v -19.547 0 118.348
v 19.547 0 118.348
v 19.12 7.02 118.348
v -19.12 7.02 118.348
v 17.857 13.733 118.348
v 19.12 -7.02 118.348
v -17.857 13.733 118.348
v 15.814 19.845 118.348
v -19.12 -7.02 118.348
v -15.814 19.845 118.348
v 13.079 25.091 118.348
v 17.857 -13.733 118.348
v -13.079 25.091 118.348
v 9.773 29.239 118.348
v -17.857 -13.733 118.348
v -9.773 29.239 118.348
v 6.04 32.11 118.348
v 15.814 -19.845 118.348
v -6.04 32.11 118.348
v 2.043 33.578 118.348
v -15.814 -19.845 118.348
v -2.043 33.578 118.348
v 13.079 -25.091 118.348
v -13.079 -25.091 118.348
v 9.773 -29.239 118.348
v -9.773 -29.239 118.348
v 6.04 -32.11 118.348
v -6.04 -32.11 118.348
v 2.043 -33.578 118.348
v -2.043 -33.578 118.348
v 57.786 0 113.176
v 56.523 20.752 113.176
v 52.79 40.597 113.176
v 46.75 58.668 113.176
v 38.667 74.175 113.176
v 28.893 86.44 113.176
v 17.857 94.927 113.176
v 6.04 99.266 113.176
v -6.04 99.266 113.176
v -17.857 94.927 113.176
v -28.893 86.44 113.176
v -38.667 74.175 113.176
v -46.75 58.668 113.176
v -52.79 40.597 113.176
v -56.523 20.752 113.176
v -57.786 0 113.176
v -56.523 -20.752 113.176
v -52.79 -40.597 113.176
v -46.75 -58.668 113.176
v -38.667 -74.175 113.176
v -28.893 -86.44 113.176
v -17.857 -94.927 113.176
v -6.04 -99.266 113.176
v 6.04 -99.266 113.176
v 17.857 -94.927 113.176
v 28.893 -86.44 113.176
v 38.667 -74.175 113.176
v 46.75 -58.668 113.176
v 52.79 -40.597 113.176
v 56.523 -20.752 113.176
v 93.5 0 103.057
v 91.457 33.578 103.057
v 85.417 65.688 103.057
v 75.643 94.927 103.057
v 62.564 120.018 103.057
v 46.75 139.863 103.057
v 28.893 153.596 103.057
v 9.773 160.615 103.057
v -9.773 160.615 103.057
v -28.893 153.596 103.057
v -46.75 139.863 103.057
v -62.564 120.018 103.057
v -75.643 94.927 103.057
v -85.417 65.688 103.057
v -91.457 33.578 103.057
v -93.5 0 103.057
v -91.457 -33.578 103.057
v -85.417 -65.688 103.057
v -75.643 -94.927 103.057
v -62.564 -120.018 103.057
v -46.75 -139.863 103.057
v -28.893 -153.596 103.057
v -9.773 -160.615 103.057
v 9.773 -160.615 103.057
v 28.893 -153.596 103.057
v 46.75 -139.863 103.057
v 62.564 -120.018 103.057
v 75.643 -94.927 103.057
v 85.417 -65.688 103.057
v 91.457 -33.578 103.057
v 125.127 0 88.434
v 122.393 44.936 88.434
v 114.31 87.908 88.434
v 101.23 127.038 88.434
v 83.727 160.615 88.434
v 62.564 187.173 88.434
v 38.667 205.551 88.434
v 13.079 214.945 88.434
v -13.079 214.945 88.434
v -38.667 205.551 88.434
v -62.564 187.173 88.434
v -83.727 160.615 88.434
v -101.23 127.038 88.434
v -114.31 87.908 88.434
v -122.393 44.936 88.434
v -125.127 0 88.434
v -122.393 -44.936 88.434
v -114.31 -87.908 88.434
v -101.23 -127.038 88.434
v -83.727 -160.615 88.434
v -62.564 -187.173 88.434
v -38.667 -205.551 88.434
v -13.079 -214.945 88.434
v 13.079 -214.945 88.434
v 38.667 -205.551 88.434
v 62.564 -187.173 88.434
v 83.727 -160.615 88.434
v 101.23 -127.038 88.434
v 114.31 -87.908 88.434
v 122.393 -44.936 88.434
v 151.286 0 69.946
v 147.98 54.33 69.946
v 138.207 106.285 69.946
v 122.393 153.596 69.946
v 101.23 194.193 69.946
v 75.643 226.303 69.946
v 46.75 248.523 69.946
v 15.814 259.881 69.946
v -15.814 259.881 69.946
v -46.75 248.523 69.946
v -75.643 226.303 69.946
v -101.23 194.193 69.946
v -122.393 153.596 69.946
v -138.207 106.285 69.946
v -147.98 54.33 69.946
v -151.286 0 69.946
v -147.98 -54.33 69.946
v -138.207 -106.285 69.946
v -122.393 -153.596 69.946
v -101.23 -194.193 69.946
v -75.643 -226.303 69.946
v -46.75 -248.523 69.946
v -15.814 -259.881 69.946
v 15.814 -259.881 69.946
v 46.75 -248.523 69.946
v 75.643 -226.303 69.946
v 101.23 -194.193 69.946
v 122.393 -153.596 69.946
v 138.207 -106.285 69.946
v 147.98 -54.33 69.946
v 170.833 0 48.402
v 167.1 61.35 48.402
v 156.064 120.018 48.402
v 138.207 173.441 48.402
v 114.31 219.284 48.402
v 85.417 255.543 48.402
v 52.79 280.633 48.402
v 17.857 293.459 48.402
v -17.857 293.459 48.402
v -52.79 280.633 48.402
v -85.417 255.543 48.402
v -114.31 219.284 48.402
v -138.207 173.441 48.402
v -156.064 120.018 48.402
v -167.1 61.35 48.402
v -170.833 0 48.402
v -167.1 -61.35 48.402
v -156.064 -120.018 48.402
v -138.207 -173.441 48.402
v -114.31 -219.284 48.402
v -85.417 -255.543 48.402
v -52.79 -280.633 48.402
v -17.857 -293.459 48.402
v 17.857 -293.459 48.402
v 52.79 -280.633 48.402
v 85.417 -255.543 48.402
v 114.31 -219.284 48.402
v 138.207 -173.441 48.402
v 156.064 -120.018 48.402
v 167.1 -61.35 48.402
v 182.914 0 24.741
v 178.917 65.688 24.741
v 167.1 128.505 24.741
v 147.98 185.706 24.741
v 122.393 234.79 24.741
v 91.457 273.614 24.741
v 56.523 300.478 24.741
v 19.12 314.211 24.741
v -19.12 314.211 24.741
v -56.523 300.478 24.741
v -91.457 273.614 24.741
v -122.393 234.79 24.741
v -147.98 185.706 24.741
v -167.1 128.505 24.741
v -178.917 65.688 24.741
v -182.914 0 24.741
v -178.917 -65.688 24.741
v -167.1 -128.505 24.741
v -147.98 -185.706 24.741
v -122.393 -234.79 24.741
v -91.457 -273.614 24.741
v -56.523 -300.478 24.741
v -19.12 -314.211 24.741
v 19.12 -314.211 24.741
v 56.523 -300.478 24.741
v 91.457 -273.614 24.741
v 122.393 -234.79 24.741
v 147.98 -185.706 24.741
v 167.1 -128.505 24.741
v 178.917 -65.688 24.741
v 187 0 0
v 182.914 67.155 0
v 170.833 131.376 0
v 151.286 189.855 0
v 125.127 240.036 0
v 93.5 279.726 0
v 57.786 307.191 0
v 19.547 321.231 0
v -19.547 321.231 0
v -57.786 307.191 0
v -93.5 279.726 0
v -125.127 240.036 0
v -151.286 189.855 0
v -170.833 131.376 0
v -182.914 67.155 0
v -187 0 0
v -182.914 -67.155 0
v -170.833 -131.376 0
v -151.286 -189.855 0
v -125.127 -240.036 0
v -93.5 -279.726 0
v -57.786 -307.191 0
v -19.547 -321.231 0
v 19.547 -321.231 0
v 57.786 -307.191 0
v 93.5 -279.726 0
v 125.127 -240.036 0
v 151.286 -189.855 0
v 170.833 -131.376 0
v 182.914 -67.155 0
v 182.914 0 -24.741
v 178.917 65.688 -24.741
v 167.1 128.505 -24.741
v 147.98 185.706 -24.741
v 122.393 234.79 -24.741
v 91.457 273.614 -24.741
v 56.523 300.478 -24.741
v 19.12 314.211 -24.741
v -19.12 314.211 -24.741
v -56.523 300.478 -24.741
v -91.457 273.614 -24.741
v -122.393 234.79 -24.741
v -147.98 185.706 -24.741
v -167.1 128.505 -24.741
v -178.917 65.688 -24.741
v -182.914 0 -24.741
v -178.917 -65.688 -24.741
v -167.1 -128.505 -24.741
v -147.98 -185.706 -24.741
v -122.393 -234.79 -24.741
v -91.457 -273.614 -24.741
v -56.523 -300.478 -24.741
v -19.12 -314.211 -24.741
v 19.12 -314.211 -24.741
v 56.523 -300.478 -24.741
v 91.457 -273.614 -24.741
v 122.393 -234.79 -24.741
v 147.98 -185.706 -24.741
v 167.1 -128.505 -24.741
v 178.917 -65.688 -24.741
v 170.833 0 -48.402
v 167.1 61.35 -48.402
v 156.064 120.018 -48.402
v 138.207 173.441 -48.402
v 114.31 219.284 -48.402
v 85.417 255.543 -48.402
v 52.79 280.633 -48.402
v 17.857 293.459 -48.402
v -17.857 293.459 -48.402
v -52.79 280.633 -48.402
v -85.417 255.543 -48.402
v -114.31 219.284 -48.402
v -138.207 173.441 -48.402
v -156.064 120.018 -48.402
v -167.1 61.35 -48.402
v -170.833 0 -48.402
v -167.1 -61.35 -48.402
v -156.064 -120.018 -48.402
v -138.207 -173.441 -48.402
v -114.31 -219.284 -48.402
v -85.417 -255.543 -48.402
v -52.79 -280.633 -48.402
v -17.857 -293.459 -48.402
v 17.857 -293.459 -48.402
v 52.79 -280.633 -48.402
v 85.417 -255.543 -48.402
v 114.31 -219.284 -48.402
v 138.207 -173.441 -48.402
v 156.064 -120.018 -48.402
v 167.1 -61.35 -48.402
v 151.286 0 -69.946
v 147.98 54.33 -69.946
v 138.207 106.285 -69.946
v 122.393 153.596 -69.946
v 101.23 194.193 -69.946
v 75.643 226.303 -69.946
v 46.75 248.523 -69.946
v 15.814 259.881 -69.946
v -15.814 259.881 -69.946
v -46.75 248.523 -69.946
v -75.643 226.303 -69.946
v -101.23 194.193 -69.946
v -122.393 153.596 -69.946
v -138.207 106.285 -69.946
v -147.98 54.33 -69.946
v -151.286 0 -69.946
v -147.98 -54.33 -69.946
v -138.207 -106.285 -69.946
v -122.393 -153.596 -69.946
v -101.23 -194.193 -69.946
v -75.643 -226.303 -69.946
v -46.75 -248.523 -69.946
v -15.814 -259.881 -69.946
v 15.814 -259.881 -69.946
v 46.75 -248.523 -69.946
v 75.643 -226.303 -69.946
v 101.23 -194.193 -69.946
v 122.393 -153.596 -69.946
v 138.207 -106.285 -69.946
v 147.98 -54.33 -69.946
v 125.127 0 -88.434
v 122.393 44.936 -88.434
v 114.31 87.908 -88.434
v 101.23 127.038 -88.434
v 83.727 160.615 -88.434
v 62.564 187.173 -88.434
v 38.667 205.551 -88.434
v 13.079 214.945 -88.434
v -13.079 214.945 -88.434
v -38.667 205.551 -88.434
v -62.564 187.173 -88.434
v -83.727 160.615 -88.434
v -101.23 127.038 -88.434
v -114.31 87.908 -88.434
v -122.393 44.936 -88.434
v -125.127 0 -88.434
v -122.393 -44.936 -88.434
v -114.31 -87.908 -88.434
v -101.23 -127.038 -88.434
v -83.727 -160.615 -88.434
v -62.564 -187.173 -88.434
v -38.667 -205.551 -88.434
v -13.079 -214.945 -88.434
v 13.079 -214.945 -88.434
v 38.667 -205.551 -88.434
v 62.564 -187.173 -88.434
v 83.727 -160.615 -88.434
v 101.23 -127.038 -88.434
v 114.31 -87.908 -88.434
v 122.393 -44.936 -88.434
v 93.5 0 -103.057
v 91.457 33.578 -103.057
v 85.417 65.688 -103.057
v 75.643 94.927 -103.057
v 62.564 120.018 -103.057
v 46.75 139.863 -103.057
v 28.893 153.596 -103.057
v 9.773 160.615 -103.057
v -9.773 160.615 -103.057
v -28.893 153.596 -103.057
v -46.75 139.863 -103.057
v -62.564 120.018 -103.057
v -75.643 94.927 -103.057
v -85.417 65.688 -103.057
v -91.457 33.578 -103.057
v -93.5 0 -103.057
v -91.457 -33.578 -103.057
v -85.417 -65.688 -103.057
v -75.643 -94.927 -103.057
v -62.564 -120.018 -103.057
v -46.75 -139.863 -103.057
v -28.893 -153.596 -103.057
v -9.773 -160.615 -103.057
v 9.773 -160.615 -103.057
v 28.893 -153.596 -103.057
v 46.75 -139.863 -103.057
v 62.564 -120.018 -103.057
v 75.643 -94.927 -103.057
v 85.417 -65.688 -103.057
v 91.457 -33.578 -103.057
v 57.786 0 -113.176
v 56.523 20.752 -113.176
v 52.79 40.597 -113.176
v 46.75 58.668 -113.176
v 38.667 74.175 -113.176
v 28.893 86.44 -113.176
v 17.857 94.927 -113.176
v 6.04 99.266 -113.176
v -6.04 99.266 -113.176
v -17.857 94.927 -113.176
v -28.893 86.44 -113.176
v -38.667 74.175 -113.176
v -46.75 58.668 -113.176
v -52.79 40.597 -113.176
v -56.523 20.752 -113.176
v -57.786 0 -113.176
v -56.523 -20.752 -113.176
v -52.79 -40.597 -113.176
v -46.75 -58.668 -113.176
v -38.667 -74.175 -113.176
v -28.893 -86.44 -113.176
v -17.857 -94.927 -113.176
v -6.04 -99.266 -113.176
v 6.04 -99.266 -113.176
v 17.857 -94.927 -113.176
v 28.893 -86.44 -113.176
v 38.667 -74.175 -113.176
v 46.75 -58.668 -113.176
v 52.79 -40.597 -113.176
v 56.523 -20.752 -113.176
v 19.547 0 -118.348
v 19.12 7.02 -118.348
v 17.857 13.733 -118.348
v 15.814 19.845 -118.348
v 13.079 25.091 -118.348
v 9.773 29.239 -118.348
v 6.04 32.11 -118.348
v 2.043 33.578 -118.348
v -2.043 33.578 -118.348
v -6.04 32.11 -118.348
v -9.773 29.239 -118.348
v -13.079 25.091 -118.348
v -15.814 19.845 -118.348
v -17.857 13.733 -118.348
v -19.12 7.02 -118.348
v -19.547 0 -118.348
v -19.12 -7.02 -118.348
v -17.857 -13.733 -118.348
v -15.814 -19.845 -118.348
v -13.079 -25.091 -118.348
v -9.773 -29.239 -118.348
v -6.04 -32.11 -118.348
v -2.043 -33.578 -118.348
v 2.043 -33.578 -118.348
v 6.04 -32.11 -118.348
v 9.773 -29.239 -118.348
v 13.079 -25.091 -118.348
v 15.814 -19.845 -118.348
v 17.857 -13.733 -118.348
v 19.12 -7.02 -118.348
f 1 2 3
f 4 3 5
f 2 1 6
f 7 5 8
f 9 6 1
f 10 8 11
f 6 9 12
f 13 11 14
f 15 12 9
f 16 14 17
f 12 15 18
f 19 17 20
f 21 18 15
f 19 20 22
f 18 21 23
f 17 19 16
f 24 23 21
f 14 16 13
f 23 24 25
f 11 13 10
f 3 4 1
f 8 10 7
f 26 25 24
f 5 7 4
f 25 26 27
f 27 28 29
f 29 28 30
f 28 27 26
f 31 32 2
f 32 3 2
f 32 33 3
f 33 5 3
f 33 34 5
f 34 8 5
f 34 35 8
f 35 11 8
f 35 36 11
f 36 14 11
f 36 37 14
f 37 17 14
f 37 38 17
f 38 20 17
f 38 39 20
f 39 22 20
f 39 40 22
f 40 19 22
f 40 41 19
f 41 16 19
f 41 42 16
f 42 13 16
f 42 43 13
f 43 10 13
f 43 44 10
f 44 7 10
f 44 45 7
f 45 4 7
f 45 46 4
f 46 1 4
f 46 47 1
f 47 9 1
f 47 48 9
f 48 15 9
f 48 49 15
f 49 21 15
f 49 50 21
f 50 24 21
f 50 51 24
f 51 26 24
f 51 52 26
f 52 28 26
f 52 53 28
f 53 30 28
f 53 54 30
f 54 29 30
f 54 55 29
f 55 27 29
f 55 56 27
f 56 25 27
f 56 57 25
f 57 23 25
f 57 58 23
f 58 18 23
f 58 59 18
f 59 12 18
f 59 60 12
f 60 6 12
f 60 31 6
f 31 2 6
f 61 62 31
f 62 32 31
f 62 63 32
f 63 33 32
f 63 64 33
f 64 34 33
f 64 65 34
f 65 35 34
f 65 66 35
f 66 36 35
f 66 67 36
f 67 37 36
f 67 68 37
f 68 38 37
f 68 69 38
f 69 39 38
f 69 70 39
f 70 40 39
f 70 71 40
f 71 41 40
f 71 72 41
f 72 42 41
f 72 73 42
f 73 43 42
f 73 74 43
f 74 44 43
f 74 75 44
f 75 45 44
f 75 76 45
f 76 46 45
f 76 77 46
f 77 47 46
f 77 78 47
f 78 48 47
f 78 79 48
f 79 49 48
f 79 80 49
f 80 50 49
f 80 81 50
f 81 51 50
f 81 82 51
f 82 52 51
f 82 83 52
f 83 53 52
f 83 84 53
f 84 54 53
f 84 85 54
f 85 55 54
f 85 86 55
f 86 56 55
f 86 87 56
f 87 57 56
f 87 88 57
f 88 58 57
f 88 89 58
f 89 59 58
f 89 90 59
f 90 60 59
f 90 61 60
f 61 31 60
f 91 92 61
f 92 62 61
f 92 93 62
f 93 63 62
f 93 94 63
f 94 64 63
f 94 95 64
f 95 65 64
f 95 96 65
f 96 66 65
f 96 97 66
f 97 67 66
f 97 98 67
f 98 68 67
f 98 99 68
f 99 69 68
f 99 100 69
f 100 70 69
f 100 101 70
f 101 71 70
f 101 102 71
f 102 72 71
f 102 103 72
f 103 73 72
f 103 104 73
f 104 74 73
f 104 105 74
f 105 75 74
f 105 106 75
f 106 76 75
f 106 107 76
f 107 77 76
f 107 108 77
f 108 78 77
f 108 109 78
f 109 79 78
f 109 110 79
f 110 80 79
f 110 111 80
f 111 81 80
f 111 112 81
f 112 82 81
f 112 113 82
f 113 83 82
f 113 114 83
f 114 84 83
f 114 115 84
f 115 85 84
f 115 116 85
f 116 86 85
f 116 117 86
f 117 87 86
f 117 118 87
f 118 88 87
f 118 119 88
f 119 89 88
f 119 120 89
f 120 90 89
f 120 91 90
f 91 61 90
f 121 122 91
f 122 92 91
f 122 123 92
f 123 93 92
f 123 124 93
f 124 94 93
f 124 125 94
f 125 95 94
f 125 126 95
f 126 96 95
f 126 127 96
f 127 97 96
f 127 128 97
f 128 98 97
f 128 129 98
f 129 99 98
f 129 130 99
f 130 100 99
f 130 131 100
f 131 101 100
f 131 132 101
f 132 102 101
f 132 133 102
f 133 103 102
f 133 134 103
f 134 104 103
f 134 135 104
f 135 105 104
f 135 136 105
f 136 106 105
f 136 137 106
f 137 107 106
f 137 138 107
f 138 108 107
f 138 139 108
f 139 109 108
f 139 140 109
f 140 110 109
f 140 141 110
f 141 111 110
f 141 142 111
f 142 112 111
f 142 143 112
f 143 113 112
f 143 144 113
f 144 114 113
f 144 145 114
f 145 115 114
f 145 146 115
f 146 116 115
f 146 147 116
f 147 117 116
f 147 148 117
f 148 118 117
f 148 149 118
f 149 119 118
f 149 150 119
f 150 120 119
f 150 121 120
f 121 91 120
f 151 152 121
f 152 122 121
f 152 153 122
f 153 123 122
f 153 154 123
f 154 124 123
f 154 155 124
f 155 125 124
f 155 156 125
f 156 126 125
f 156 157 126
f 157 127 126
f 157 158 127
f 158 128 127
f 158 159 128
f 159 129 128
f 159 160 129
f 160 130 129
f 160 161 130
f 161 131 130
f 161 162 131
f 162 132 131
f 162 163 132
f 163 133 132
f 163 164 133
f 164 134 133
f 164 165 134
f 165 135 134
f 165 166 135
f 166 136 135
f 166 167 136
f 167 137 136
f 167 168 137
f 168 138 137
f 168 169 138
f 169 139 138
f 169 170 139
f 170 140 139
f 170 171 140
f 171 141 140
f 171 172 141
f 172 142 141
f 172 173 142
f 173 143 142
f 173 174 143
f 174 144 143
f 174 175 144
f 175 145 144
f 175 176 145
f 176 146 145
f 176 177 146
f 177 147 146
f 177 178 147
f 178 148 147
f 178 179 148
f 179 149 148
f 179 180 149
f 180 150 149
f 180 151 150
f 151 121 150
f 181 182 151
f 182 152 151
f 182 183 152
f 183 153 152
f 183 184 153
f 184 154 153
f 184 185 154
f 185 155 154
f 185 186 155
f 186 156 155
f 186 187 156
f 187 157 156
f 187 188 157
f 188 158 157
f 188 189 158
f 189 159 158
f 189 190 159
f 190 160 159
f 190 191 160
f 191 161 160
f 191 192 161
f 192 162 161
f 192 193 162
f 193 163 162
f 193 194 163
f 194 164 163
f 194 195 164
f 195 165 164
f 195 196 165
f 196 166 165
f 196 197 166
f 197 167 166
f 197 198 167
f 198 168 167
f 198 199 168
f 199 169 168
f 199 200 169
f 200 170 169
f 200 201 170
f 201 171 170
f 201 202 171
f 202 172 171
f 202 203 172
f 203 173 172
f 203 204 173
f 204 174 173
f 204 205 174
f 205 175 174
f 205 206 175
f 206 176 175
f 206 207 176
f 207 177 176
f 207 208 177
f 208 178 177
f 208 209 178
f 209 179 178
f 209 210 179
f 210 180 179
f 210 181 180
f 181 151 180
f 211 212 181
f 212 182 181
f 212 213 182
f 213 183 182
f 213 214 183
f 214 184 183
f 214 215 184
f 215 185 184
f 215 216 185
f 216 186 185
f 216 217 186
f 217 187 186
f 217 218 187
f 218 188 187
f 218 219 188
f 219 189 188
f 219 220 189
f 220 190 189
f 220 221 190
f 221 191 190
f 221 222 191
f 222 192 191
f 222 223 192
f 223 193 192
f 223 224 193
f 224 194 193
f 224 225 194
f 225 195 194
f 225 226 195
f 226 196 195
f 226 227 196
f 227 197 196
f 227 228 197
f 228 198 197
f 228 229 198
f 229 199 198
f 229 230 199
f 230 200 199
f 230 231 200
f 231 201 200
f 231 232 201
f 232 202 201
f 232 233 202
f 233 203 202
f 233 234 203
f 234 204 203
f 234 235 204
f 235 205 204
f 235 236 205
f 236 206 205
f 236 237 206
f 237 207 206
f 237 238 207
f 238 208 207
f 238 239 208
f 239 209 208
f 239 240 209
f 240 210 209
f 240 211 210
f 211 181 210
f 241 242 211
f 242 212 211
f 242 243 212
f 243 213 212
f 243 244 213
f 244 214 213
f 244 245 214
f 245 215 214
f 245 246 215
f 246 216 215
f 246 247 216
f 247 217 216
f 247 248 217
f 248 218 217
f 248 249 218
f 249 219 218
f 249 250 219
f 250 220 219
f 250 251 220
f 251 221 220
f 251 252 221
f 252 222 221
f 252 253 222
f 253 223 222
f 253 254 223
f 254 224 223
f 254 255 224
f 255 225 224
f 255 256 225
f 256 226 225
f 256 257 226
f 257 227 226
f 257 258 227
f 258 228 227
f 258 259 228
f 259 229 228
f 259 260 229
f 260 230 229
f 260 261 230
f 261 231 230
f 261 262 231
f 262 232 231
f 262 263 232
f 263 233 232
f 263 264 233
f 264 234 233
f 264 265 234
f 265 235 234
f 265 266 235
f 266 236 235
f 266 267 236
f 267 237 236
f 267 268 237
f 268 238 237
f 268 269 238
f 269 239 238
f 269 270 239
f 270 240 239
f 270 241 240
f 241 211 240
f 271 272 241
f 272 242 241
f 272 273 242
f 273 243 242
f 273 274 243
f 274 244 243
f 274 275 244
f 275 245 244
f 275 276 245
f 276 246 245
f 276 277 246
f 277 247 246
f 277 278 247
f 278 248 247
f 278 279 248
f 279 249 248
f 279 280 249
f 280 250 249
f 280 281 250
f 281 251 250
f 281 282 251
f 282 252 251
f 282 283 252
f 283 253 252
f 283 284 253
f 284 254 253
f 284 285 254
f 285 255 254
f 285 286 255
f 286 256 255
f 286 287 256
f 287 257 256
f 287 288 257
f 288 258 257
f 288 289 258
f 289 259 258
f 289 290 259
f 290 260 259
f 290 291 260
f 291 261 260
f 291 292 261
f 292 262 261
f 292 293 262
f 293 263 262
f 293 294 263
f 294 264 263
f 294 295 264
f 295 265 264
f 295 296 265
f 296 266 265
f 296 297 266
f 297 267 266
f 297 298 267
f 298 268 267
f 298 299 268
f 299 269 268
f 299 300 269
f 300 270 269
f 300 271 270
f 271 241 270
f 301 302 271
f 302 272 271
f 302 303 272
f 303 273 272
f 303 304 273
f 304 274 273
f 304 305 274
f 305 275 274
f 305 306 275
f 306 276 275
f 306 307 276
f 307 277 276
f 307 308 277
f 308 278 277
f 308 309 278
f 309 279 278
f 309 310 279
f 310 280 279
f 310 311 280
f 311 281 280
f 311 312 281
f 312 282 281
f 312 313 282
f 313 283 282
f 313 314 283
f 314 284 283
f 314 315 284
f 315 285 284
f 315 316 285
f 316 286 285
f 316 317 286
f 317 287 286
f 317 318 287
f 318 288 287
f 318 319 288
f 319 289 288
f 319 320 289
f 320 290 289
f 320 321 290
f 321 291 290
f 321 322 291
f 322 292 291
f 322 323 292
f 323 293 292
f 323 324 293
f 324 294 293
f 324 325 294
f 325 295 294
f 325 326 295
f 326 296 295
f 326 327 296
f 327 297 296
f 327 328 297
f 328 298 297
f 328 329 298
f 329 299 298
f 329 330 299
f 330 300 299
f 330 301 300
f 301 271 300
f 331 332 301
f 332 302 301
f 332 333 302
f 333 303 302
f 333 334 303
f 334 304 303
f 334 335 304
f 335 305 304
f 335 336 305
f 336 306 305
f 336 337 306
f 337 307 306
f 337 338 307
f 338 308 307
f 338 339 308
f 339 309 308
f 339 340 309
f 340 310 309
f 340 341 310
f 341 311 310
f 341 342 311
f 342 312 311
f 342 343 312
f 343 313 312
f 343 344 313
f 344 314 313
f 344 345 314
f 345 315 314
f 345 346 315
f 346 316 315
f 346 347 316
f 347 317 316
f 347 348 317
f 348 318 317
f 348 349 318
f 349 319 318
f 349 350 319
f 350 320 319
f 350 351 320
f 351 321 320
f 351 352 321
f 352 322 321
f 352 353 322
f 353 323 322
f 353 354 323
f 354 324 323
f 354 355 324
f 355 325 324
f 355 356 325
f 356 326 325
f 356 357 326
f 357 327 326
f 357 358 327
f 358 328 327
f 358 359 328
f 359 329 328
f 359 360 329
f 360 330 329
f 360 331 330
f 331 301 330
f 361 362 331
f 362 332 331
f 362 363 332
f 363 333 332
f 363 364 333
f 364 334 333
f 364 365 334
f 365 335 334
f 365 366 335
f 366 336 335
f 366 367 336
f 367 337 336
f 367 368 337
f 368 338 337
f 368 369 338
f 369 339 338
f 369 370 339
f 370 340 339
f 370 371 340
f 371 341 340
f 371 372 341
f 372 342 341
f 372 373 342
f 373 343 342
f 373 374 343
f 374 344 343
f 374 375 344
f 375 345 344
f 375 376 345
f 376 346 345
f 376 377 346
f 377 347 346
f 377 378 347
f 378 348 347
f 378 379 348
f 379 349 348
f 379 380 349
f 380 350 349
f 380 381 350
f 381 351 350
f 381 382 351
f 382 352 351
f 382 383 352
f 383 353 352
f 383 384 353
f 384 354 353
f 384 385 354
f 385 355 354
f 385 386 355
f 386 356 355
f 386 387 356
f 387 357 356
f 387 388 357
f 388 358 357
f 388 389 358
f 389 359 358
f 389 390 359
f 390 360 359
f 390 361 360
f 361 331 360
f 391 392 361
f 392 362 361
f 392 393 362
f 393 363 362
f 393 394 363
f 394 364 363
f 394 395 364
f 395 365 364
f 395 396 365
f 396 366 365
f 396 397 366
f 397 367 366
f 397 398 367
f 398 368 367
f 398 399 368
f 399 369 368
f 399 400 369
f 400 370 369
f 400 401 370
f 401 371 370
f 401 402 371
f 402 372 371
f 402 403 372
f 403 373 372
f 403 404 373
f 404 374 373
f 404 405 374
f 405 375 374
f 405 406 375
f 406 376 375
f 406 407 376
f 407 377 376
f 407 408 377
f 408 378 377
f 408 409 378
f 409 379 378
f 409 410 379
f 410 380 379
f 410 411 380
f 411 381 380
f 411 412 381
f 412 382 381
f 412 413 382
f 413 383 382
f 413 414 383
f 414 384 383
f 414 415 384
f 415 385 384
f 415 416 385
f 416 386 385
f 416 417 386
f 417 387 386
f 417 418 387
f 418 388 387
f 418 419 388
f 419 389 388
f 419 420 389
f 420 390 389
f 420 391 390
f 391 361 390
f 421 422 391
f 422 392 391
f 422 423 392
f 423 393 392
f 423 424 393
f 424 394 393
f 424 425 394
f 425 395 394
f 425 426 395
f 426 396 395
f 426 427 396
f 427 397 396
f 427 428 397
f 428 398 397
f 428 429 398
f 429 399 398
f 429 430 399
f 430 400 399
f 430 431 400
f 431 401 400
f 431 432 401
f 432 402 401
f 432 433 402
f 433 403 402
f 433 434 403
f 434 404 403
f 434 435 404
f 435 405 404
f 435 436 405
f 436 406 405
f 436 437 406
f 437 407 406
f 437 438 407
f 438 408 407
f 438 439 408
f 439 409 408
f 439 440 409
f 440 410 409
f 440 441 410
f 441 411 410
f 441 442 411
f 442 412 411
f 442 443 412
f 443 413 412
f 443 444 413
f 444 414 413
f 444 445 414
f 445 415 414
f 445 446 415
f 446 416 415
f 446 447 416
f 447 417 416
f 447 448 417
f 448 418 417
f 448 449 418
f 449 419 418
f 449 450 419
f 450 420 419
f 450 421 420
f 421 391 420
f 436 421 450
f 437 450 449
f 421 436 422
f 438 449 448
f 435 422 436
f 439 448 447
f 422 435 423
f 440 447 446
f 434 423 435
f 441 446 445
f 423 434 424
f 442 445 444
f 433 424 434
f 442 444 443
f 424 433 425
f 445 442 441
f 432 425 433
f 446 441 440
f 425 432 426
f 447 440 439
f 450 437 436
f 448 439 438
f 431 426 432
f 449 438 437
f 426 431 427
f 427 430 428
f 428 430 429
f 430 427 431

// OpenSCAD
// Generated by SolidPython 1.0.1 on 2020-07-29 00:46:50


scale(v = [11, 19, 7]) {
	sphere(r = 17);
}
/***********************************************
*********      SolidPython code:      **********
************************************************
 
# import packages: SolidPython
from solid import *
from solid.utils import *
from itertools import chain, combinations, permutations


class Resize:

    def __init__(self, scad_file):
        self.scad_file = scad_file
        #self.scad_file = import_scad(scad_file)
        # cone/cylinder param:
        self.r1 = 0
        self.r2 = 0
        self.h = 0
        # rectangular prism param:
        self.w = 0
        self.l = 0
        # ellipse param:
        self.r = 0

    # import OpenScad code (file name corresponds to shape)


    # classify shape + parameters
    def assign(self, param1, param2, param3):
        if self.scad_file == 'cone.scad':
            self.r1 = param1
            self.r2 = param2
            self.h = param3
        elif self.scad_file == 'cylinder.scad':
            self.r1 = param1
            self.r2 = param2
            self.h = param3
        elif self.scad_file == 'rectangularPrism.scad':
            self.h = param1
            self.l = param2
            self.w = param3
        else:
            self.r = param1
            self.h = param2

    # resize parameters
    def iterate(self):
        x = range(3, 20, 2)
        i = 1
        if self.scad_file == 'cone.scad':
            tempList = list(permutations(x, 2))
            for temp in tempList:
                param1 = temp[0]
                param2 = temp[1]
                filepath = 'produced_scad_files/' + 'cone' + str(param1) + '_' + str(param2) + '_' + '.scad'
                scad_render_to_file(cylinder(h=param1, r1=param2, r2=0), filepath)

        elif self.scad_file == 'cylinder.scad':
            tempList = list(permutations(x, 3))
            for temp in tempList:
                param1 = temp[0]
                param2 = temp[1]
                filepath = 'produced_scad_files/' + 'cylinder' + str(param1) + '_' + str(param2) + '_' + '.scad'
                scad_render_to_file(cylinder(h=param1, r1=param2, r2=param2), filepath)

        elif self.scad_file == 'rectangularPrism.scad':
            tempList = list(permutations(x, 3))
            for temp in tempList:
                param1 = temp[0]
                param2 = temp[1]
                param3 = temp[2]
                filepath = 'produced_scad_files/' + 'rectangularPrism' + str(param1) + '_' + str(param2) + '_' + str(
                    param3) + '.scad'
                scad_render_to_file(cube(size=(param1, param2, param3)), filepath)

        elif self.scad_file == 'ellipse.scad':
            tempList = list(permutations(x, 4))
            for temp in tempList:
                param1 = temp[0]
                param2 = temp[1]
                param3 = temp[2]
                param4 = temp[3]
                filepath = 'produced_scad_files/' + 'ellipse' + str(param1) + '_' + str(param2) + '_' + str(param3) + '_' + str(param4) + '.scad'
                scad_render_to_file(scale([param1, param2, param3])(sphere(r=param4)), filepath)

    def render_to_scadfile(self):
        scad_render_to_file(scad, 'example.scad') 
 
************************************************/
